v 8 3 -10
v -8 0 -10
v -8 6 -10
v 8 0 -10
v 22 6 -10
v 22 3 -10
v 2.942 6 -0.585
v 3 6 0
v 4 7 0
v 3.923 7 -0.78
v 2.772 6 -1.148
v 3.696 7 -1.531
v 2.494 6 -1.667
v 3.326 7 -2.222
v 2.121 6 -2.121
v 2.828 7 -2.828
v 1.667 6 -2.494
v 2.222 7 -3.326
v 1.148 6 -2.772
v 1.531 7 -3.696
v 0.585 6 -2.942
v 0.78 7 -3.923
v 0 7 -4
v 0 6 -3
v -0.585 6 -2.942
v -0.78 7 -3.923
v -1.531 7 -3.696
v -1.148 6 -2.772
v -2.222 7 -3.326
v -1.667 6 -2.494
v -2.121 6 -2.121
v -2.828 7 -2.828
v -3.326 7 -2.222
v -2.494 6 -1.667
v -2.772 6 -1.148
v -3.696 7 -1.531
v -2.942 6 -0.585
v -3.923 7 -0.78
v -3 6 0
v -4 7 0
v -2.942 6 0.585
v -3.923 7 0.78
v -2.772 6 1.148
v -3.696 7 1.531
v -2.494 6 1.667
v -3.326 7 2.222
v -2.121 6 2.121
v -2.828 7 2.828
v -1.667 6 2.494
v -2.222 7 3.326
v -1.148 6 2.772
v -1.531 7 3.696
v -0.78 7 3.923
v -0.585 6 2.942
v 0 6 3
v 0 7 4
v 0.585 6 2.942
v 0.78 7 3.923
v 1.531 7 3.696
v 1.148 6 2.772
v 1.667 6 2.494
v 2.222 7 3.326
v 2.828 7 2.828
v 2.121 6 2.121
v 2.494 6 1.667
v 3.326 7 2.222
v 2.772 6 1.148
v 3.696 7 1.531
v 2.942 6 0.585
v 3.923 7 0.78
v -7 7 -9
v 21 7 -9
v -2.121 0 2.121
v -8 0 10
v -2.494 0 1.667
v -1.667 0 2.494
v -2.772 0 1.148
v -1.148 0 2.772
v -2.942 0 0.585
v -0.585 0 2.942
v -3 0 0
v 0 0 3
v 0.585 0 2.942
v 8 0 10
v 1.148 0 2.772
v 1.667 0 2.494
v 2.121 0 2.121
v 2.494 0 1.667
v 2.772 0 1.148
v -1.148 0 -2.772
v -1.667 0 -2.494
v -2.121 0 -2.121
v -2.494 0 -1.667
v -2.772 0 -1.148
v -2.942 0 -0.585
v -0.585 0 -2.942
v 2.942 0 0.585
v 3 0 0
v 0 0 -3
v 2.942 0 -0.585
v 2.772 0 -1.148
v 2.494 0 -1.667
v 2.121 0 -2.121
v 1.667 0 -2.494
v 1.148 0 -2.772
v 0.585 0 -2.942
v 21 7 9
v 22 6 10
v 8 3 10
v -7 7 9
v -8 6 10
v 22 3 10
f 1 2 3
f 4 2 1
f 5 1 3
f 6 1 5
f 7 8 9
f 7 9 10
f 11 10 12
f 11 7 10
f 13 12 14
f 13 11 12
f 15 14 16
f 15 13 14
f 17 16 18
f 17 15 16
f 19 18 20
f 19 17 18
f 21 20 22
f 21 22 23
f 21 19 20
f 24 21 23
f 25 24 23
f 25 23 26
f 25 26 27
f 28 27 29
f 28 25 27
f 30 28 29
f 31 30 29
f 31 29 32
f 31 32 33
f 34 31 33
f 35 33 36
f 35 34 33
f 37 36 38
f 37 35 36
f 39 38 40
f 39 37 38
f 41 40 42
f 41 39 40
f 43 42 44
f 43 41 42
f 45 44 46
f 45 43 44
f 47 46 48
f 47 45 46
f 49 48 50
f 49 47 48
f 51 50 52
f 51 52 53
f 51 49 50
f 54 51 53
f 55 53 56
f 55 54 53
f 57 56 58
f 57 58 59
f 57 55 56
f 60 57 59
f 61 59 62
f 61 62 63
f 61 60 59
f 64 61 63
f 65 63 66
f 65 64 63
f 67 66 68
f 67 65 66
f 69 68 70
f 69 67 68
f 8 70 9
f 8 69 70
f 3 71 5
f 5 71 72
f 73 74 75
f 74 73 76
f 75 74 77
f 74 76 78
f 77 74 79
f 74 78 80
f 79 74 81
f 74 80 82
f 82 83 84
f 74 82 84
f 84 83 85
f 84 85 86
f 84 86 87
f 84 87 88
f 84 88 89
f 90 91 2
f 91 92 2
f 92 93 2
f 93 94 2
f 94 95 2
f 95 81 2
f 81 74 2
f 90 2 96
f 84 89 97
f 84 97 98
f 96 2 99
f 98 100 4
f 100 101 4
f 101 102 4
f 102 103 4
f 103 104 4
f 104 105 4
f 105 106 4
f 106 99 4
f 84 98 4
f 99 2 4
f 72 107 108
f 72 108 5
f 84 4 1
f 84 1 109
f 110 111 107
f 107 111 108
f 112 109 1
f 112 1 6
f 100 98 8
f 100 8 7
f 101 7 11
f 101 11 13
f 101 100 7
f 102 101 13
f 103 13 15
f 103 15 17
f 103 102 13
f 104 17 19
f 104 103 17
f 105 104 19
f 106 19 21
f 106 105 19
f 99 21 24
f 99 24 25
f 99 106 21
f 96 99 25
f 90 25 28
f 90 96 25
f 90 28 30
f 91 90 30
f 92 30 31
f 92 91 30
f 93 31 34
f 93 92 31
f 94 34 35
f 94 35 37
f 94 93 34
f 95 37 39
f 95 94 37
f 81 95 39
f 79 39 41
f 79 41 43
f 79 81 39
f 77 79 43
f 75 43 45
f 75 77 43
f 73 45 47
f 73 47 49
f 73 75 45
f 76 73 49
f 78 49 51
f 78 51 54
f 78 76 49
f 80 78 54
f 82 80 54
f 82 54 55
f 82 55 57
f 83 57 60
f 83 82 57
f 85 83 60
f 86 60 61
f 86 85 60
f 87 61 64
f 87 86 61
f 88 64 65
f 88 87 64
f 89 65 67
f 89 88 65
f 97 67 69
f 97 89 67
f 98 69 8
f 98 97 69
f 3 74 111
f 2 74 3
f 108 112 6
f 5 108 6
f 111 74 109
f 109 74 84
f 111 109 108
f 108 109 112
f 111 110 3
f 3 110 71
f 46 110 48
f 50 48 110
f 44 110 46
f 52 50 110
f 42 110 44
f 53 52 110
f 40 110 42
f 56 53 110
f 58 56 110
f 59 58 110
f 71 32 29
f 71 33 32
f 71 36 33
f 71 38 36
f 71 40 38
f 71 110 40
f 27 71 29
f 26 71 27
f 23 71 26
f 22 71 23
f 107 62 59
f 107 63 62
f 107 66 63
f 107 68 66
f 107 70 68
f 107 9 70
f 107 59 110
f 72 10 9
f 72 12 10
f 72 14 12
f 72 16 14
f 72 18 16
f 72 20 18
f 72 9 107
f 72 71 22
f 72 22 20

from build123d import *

# Parameters (mm, degrees)
SKETCH1_W           = 30
SKETCH1_H           = 20
SKETCH1_R           = 3
BOSS_EXTRUDE1_DEPTH = 7
SKETCH2_OUTSIDE_W   = 39.346
SKETCH2_OUTSIDE_H   = 29.346
SKETCH2_OUTSIDE_W_2 = 16
SKETCH2_OUTSIDE_H_2 = 20
CUT_EXTRUDE1_DEPTH  = 3
CHAMFER1_SIZE       = 1


with BuildPart() as part:
    # Sketch1 → Boss-Extrude1 (new body)
    with BuildSketch(Plane(origin=(0, 0, 0), x_dir=(1, 0, 0), z_dir=(0, 1, 0))):
        with Locations((7, 0)):
            Rectangle(SKETCH1_W, SKETCH1_H)
        Circle(SKETCH1_R, mode=Mode.SUBTRACT)
    extrude(amount=BOSS_EXTRUDE1_DEPTH)

    # Sketch2 outside → Cut-Extrude1 (cut)
    with BuildSketch(Plane.XZ):
        with Locations((7, 0)):
            Rectangle(SKETCH2_OUTSIDE_W, SKETCH2_OUTSIDE_H)
        Rectangle(SKETCH2_OUTSIDE_W_2, SKETCH2_OUTSIDE_H_2, mode=Mode.SUBTRACT)
    extrude(amount=-CUT_EXTRUDE1_DEPTH, mode=Mode.SUBTRACT)

    # Chamfer1
    chamfer1_edges = [part.edges().sort_by_distance(p)[0] for p in [
        (-3, 7, 0),
        (22, 7, 0),
        (7, 7, -10),
        (-8, 7, 0),
        (7, 7, 10),
    ]]
    chamfer(chamfer1_edges, length=CHAMFER1_SIZE)


solid = part.part
